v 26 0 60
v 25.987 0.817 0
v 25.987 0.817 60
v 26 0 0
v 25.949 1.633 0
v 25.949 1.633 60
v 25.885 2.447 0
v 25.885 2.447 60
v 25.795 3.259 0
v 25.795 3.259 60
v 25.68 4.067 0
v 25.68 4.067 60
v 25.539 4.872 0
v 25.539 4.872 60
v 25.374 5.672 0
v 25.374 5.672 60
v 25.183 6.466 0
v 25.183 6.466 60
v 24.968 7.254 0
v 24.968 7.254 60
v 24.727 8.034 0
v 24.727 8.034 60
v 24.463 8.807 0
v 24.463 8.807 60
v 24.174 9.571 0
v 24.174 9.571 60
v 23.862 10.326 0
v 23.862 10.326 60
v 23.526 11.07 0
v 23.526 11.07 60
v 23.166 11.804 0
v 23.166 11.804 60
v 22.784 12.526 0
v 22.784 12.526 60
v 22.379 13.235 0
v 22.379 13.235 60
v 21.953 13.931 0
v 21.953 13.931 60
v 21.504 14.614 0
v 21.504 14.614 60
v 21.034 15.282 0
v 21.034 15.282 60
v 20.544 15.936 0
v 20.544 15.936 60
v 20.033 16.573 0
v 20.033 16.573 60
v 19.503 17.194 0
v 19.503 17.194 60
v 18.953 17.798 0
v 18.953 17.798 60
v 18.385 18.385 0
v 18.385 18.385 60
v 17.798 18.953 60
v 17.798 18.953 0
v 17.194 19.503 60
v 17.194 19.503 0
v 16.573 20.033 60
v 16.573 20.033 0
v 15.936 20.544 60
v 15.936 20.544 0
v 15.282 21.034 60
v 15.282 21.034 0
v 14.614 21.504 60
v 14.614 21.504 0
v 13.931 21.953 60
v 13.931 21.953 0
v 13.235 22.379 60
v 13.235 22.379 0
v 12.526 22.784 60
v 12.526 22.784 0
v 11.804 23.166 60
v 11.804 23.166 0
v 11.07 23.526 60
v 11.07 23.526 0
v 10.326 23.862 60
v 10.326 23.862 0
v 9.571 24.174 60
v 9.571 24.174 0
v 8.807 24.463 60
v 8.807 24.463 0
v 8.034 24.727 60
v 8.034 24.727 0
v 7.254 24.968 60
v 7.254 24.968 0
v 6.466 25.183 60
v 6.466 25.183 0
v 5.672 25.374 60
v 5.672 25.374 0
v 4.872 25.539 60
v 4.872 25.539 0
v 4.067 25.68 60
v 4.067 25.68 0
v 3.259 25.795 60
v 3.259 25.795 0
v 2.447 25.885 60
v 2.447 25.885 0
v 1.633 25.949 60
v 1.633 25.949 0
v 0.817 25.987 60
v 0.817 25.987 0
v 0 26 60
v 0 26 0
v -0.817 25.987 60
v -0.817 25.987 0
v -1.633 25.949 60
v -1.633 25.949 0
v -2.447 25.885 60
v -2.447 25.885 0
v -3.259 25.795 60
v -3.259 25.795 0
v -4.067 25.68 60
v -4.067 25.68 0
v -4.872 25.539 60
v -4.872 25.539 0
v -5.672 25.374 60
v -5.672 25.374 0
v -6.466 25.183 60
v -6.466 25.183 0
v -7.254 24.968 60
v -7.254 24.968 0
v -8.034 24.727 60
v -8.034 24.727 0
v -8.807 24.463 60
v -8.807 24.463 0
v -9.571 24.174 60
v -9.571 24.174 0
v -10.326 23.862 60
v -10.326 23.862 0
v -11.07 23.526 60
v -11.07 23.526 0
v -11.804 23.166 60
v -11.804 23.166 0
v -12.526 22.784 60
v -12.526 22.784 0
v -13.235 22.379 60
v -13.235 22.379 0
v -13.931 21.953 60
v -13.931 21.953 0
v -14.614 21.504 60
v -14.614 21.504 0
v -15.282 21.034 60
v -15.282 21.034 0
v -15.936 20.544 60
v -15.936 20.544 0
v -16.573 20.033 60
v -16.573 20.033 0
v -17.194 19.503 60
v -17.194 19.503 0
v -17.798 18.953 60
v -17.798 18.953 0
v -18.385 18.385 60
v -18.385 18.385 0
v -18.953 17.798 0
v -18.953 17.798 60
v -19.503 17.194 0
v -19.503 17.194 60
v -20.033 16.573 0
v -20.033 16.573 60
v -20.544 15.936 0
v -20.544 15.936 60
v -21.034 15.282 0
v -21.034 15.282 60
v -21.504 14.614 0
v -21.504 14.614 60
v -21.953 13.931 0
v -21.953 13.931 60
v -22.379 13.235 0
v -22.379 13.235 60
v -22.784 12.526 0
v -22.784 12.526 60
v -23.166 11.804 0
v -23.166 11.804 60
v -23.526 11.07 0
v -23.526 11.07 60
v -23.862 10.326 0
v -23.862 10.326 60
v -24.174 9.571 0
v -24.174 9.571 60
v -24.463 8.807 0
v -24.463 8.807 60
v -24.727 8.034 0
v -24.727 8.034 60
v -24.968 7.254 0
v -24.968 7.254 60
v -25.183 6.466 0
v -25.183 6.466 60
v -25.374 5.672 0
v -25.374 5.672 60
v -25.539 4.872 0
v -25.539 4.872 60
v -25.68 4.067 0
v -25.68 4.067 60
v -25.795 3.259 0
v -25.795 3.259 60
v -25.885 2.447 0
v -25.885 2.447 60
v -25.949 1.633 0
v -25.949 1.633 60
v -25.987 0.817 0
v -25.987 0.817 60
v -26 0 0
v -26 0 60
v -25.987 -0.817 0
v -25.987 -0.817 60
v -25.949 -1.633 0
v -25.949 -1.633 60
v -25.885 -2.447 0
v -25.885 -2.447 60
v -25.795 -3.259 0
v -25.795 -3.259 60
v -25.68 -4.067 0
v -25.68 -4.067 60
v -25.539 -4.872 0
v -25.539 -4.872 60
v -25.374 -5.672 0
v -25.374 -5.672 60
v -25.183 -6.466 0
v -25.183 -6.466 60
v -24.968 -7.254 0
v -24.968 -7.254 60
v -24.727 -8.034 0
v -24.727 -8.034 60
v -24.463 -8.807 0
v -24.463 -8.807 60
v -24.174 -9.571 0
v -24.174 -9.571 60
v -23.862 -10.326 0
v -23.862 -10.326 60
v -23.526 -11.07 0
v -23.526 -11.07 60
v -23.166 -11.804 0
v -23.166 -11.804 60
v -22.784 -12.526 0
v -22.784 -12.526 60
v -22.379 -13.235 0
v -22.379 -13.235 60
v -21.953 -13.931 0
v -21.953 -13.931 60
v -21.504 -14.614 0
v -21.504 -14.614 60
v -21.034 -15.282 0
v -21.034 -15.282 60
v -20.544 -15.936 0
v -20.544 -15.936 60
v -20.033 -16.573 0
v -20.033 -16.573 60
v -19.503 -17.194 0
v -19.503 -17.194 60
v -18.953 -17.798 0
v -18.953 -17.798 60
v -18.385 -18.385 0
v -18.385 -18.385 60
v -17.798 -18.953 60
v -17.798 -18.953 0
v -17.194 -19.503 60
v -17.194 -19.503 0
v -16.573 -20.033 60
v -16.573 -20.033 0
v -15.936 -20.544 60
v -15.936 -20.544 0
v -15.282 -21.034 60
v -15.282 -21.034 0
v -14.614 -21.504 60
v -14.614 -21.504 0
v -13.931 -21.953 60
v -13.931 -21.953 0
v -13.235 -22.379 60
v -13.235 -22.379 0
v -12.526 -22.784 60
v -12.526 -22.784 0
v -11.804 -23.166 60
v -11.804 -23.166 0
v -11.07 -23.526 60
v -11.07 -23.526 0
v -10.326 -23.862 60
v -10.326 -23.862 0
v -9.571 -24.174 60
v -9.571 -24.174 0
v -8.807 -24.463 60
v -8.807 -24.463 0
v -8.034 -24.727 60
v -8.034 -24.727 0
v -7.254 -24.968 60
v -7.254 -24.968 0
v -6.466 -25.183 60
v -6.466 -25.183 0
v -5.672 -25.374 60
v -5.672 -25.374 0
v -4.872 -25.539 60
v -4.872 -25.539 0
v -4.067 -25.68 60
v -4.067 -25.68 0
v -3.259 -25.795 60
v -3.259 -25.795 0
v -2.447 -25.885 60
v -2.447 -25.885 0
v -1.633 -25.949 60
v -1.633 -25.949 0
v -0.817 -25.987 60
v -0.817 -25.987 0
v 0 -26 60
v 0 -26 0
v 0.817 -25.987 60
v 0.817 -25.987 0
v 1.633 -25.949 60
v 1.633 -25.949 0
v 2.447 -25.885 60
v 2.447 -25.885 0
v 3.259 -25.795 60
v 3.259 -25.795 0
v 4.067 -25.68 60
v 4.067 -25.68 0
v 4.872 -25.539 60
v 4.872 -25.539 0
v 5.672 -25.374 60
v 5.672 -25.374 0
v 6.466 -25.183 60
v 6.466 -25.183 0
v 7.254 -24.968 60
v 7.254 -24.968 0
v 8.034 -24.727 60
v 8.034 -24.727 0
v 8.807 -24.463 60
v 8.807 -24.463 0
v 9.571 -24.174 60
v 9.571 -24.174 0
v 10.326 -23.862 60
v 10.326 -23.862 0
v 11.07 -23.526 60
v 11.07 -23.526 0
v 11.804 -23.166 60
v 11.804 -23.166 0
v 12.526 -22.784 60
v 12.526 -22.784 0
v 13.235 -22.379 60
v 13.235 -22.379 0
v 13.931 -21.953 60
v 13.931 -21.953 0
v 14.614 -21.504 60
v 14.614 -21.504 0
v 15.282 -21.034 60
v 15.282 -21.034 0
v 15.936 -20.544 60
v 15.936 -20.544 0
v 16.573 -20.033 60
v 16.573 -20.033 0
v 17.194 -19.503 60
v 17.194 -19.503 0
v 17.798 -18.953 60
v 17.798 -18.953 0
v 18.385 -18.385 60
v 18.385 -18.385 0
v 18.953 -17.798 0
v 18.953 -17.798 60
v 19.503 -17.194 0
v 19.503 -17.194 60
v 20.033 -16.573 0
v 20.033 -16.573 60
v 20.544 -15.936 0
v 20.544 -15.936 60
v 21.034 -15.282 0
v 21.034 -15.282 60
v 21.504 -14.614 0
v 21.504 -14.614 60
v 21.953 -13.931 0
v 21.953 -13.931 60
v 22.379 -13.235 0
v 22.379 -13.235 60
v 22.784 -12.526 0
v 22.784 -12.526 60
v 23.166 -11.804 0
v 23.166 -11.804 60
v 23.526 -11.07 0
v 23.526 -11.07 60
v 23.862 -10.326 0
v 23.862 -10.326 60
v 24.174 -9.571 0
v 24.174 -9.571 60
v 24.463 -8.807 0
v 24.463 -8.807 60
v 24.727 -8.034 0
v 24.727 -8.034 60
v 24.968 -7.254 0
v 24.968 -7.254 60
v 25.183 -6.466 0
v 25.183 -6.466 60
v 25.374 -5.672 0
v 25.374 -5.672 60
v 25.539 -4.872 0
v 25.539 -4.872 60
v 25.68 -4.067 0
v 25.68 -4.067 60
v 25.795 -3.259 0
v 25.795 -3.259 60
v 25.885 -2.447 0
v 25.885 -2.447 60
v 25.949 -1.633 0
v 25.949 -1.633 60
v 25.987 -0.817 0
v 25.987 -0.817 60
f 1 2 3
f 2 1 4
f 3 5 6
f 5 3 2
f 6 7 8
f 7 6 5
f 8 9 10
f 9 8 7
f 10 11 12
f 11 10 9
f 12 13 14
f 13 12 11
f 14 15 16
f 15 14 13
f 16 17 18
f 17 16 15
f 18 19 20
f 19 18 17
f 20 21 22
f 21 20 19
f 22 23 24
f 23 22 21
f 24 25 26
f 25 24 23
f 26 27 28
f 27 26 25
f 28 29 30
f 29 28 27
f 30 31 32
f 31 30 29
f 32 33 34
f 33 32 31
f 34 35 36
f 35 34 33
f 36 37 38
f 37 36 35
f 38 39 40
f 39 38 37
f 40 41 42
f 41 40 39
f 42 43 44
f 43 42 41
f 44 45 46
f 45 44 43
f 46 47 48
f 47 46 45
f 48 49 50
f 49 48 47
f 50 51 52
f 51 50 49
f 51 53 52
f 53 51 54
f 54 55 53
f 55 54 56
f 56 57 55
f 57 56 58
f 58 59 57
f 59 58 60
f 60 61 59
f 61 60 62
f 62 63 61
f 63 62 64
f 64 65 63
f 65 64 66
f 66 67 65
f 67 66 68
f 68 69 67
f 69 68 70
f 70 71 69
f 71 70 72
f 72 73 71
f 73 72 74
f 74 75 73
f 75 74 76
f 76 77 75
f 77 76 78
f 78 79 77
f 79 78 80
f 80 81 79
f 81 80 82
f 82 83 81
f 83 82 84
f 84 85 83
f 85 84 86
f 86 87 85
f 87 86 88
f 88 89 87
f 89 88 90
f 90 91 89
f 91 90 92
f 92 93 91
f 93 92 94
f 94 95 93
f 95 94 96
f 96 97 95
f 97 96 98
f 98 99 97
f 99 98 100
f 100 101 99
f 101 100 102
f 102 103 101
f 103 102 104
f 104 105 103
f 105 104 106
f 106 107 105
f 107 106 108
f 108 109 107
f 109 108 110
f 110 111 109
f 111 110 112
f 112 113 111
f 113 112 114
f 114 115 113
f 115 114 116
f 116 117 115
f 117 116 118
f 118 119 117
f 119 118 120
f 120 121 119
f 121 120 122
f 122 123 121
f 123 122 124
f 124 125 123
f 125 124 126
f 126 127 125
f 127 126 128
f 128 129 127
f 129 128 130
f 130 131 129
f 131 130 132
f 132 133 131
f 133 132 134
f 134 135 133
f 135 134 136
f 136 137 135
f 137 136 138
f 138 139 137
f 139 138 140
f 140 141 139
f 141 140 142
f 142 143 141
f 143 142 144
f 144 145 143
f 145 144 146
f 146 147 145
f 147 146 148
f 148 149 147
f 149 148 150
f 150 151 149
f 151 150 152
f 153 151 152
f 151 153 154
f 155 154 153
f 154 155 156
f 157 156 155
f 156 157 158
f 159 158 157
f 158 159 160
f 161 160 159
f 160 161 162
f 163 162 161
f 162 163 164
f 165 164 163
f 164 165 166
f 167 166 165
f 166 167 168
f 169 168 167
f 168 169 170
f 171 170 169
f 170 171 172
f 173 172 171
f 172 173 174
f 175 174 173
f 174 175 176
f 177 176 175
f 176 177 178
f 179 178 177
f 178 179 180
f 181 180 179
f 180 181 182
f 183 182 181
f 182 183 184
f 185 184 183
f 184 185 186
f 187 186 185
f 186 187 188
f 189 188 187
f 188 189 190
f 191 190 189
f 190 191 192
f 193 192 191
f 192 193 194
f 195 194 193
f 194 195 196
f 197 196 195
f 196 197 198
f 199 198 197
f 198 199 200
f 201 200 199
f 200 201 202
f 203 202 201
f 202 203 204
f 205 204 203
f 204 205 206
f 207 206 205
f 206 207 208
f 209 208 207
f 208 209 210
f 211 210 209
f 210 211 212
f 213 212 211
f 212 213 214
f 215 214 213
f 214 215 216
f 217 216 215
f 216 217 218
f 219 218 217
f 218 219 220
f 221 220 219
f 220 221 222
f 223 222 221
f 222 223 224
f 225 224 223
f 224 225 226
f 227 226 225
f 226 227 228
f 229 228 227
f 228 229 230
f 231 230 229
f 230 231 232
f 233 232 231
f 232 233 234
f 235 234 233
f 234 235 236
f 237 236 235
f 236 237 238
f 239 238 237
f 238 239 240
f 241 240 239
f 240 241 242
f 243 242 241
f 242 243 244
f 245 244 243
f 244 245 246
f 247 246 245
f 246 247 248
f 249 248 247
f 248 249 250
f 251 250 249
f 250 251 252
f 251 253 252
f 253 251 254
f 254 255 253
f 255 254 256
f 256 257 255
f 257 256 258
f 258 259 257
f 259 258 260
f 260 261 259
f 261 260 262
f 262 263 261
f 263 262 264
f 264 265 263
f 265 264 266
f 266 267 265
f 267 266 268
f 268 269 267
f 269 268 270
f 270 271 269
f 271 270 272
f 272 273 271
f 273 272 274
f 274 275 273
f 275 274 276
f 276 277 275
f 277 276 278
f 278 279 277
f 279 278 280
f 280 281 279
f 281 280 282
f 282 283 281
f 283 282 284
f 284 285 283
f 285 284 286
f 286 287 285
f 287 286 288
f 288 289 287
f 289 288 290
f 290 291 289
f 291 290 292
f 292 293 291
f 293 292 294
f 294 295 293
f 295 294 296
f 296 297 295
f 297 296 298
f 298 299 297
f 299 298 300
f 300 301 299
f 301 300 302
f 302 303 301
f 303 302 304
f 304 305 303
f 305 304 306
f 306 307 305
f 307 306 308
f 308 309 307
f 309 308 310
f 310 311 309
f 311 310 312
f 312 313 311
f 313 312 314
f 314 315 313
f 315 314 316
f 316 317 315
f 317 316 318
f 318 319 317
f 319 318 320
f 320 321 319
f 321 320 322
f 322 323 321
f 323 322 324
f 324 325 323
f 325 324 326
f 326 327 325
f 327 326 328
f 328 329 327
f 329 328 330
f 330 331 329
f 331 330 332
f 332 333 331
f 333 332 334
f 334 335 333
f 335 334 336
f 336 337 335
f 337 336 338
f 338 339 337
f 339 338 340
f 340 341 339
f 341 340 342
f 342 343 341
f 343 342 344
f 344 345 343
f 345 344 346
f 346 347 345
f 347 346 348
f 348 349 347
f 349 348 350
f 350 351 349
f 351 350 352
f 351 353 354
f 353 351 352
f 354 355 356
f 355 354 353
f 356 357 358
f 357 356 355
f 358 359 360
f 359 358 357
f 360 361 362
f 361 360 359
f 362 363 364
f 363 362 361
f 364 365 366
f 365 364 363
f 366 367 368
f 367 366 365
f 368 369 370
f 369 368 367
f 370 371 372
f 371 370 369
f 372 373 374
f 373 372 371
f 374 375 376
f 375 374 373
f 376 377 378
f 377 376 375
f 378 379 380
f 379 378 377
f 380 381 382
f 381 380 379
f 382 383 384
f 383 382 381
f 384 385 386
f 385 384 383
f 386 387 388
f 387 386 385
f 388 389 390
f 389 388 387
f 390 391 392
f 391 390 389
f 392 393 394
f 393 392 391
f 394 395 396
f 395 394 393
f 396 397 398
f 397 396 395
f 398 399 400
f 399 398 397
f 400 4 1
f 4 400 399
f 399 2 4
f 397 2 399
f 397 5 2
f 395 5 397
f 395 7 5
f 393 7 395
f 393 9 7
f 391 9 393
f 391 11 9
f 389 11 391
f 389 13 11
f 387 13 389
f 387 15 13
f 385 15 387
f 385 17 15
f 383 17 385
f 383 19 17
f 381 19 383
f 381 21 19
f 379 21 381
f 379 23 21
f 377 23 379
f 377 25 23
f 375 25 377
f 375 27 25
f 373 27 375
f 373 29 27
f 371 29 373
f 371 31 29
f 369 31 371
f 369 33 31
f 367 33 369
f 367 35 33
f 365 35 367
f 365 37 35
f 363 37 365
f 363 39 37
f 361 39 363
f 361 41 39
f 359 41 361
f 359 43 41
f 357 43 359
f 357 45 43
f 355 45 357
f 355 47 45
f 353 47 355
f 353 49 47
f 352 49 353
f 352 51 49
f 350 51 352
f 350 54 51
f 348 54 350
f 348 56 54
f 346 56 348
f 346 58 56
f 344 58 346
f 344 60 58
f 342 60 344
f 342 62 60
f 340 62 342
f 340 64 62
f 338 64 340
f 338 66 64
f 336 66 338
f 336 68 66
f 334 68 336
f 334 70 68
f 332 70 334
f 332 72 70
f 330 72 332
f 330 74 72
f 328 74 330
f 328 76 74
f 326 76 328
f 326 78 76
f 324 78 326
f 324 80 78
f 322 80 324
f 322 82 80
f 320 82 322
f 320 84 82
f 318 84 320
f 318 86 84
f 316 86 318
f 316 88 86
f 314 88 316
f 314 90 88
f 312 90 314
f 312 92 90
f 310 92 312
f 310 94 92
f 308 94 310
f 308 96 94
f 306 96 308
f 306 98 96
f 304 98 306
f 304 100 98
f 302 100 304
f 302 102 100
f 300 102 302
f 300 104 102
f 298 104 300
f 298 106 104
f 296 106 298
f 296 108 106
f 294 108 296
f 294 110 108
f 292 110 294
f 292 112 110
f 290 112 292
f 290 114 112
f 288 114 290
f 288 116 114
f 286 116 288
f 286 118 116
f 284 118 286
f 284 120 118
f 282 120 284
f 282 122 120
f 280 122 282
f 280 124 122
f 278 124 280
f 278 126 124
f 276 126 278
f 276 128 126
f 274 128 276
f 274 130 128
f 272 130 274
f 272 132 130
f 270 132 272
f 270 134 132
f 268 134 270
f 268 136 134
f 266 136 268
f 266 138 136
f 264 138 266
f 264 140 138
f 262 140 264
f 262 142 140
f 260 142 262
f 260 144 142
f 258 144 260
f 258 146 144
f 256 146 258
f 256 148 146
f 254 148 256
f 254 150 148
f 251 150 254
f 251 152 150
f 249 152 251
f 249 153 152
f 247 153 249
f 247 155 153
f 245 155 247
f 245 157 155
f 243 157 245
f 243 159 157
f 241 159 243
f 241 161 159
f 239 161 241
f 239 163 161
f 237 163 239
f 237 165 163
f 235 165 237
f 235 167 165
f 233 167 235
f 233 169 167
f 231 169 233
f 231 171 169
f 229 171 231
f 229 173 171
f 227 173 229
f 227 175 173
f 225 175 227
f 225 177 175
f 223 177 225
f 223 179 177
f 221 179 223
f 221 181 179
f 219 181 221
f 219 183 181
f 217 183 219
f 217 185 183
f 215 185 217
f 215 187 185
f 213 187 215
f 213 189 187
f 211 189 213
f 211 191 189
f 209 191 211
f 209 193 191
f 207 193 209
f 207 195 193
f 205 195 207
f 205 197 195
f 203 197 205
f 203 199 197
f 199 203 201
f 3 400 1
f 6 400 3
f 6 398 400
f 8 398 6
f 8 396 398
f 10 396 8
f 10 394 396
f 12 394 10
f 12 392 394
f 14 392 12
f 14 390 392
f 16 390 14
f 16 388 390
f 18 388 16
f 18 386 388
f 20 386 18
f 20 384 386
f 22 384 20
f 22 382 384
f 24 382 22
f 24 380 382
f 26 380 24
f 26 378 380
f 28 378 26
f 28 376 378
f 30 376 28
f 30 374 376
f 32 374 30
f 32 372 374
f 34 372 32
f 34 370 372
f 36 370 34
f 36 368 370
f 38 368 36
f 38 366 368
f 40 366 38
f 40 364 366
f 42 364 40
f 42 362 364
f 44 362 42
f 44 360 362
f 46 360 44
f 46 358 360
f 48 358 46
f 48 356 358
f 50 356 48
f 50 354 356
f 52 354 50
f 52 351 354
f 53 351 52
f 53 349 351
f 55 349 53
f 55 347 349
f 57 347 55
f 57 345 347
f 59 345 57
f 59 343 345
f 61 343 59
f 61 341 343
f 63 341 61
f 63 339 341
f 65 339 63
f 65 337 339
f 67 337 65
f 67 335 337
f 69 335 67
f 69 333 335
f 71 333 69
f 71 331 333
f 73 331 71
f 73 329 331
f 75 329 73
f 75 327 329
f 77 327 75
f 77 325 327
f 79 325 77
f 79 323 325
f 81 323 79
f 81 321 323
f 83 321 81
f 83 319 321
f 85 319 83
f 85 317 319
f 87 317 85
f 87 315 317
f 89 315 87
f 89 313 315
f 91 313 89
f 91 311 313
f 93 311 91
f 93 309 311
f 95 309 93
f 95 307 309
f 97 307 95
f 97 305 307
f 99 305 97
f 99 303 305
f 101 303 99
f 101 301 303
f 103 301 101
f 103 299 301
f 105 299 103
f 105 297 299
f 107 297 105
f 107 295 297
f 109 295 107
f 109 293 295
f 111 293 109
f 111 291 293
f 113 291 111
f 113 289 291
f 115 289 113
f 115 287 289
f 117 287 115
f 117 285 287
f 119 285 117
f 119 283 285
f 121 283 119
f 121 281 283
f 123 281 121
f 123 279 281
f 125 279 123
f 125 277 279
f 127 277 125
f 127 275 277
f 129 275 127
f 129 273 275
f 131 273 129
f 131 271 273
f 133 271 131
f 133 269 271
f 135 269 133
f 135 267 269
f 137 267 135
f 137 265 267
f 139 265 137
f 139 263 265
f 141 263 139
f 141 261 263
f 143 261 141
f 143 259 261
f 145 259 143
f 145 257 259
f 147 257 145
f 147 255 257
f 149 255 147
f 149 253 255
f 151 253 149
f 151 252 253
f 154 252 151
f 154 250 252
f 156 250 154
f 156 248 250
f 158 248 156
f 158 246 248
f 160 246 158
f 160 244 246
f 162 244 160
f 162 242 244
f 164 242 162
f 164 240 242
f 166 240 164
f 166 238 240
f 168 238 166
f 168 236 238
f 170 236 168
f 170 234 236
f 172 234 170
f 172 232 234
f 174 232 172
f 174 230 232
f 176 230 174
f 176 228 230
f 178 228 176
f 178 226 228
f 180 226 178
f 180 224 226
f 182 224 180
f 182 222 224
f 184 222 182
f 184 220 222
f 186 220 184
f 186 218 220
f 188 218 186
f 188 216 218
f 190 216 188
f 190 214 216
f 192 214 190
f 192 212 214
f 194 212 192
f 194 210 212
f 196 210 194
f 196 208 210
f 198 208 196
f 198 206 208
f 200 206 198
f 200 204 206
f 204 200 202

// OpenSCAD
module bed_foot()
{
  h=60;
  d=52;
  cylinder(d=d, h=h, $fn=200);
}


bed_foot();
